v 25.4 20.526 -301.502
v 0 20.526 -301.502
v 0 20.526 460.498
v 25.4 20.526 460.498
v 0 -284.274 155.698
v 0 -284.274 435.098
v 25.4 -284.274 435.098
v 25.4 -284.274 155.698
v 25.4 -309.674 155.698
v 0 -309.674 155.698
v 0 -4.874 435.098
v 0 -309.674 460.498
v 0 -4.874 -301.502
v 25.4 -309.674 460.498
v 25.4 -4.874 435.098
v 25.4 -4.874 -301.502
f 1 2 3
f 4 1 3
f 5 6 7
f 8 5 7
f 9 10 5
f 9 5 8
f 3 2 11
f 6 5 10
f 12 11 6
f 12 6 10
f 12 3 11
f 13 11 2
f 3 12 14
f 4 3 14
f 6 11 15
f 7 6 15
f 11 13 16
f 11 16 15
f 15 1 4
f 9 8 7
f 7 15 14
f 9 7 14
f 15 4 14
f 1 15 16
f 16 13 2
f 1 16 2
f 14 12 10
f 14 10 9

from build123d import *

# Parameters (mm, degrees)
F0_W     = 25.4
F0_H     = 762
F1_DEPTH = 25.4
F2_W     = 25.4
F2_H     = 25.4
F3_DEPTH = 304.8
F4_W     = 25.4
F4_H     = 25.4
F5_DEPTH = 279.4


with BuildPart() as f1:
    # F0 (on Right) → F1 (new body)
    with BuildSketch(Plane.YZ):
        with Locations((7.826157, 79.498407)):
            Rectangle(F0_W, F0_H)
    extrude(amount=F1_DEPTH)

    # F2 (on face) → F3 (join)
    with BuildSketch(Plane.XZ.offset(4.873843)):
        with Locations((12.7, 447.798407)):
            Rectangle(F2_W, F2_H)
    extrude(amount=F3_DEPTH)

    # F4 (on face) → F5 (join)
    with BuildSketch(Plane(origin=(0, 0, 435.098407), x_dir=(1, 0, 0), z_dir=(0, 0, -1))):
        with Locations((12.7, 296.973843)):
            Rectangle(F4_W, F4_H)
    extrude(amount=F5_DEPTH)


solid = f1.part
